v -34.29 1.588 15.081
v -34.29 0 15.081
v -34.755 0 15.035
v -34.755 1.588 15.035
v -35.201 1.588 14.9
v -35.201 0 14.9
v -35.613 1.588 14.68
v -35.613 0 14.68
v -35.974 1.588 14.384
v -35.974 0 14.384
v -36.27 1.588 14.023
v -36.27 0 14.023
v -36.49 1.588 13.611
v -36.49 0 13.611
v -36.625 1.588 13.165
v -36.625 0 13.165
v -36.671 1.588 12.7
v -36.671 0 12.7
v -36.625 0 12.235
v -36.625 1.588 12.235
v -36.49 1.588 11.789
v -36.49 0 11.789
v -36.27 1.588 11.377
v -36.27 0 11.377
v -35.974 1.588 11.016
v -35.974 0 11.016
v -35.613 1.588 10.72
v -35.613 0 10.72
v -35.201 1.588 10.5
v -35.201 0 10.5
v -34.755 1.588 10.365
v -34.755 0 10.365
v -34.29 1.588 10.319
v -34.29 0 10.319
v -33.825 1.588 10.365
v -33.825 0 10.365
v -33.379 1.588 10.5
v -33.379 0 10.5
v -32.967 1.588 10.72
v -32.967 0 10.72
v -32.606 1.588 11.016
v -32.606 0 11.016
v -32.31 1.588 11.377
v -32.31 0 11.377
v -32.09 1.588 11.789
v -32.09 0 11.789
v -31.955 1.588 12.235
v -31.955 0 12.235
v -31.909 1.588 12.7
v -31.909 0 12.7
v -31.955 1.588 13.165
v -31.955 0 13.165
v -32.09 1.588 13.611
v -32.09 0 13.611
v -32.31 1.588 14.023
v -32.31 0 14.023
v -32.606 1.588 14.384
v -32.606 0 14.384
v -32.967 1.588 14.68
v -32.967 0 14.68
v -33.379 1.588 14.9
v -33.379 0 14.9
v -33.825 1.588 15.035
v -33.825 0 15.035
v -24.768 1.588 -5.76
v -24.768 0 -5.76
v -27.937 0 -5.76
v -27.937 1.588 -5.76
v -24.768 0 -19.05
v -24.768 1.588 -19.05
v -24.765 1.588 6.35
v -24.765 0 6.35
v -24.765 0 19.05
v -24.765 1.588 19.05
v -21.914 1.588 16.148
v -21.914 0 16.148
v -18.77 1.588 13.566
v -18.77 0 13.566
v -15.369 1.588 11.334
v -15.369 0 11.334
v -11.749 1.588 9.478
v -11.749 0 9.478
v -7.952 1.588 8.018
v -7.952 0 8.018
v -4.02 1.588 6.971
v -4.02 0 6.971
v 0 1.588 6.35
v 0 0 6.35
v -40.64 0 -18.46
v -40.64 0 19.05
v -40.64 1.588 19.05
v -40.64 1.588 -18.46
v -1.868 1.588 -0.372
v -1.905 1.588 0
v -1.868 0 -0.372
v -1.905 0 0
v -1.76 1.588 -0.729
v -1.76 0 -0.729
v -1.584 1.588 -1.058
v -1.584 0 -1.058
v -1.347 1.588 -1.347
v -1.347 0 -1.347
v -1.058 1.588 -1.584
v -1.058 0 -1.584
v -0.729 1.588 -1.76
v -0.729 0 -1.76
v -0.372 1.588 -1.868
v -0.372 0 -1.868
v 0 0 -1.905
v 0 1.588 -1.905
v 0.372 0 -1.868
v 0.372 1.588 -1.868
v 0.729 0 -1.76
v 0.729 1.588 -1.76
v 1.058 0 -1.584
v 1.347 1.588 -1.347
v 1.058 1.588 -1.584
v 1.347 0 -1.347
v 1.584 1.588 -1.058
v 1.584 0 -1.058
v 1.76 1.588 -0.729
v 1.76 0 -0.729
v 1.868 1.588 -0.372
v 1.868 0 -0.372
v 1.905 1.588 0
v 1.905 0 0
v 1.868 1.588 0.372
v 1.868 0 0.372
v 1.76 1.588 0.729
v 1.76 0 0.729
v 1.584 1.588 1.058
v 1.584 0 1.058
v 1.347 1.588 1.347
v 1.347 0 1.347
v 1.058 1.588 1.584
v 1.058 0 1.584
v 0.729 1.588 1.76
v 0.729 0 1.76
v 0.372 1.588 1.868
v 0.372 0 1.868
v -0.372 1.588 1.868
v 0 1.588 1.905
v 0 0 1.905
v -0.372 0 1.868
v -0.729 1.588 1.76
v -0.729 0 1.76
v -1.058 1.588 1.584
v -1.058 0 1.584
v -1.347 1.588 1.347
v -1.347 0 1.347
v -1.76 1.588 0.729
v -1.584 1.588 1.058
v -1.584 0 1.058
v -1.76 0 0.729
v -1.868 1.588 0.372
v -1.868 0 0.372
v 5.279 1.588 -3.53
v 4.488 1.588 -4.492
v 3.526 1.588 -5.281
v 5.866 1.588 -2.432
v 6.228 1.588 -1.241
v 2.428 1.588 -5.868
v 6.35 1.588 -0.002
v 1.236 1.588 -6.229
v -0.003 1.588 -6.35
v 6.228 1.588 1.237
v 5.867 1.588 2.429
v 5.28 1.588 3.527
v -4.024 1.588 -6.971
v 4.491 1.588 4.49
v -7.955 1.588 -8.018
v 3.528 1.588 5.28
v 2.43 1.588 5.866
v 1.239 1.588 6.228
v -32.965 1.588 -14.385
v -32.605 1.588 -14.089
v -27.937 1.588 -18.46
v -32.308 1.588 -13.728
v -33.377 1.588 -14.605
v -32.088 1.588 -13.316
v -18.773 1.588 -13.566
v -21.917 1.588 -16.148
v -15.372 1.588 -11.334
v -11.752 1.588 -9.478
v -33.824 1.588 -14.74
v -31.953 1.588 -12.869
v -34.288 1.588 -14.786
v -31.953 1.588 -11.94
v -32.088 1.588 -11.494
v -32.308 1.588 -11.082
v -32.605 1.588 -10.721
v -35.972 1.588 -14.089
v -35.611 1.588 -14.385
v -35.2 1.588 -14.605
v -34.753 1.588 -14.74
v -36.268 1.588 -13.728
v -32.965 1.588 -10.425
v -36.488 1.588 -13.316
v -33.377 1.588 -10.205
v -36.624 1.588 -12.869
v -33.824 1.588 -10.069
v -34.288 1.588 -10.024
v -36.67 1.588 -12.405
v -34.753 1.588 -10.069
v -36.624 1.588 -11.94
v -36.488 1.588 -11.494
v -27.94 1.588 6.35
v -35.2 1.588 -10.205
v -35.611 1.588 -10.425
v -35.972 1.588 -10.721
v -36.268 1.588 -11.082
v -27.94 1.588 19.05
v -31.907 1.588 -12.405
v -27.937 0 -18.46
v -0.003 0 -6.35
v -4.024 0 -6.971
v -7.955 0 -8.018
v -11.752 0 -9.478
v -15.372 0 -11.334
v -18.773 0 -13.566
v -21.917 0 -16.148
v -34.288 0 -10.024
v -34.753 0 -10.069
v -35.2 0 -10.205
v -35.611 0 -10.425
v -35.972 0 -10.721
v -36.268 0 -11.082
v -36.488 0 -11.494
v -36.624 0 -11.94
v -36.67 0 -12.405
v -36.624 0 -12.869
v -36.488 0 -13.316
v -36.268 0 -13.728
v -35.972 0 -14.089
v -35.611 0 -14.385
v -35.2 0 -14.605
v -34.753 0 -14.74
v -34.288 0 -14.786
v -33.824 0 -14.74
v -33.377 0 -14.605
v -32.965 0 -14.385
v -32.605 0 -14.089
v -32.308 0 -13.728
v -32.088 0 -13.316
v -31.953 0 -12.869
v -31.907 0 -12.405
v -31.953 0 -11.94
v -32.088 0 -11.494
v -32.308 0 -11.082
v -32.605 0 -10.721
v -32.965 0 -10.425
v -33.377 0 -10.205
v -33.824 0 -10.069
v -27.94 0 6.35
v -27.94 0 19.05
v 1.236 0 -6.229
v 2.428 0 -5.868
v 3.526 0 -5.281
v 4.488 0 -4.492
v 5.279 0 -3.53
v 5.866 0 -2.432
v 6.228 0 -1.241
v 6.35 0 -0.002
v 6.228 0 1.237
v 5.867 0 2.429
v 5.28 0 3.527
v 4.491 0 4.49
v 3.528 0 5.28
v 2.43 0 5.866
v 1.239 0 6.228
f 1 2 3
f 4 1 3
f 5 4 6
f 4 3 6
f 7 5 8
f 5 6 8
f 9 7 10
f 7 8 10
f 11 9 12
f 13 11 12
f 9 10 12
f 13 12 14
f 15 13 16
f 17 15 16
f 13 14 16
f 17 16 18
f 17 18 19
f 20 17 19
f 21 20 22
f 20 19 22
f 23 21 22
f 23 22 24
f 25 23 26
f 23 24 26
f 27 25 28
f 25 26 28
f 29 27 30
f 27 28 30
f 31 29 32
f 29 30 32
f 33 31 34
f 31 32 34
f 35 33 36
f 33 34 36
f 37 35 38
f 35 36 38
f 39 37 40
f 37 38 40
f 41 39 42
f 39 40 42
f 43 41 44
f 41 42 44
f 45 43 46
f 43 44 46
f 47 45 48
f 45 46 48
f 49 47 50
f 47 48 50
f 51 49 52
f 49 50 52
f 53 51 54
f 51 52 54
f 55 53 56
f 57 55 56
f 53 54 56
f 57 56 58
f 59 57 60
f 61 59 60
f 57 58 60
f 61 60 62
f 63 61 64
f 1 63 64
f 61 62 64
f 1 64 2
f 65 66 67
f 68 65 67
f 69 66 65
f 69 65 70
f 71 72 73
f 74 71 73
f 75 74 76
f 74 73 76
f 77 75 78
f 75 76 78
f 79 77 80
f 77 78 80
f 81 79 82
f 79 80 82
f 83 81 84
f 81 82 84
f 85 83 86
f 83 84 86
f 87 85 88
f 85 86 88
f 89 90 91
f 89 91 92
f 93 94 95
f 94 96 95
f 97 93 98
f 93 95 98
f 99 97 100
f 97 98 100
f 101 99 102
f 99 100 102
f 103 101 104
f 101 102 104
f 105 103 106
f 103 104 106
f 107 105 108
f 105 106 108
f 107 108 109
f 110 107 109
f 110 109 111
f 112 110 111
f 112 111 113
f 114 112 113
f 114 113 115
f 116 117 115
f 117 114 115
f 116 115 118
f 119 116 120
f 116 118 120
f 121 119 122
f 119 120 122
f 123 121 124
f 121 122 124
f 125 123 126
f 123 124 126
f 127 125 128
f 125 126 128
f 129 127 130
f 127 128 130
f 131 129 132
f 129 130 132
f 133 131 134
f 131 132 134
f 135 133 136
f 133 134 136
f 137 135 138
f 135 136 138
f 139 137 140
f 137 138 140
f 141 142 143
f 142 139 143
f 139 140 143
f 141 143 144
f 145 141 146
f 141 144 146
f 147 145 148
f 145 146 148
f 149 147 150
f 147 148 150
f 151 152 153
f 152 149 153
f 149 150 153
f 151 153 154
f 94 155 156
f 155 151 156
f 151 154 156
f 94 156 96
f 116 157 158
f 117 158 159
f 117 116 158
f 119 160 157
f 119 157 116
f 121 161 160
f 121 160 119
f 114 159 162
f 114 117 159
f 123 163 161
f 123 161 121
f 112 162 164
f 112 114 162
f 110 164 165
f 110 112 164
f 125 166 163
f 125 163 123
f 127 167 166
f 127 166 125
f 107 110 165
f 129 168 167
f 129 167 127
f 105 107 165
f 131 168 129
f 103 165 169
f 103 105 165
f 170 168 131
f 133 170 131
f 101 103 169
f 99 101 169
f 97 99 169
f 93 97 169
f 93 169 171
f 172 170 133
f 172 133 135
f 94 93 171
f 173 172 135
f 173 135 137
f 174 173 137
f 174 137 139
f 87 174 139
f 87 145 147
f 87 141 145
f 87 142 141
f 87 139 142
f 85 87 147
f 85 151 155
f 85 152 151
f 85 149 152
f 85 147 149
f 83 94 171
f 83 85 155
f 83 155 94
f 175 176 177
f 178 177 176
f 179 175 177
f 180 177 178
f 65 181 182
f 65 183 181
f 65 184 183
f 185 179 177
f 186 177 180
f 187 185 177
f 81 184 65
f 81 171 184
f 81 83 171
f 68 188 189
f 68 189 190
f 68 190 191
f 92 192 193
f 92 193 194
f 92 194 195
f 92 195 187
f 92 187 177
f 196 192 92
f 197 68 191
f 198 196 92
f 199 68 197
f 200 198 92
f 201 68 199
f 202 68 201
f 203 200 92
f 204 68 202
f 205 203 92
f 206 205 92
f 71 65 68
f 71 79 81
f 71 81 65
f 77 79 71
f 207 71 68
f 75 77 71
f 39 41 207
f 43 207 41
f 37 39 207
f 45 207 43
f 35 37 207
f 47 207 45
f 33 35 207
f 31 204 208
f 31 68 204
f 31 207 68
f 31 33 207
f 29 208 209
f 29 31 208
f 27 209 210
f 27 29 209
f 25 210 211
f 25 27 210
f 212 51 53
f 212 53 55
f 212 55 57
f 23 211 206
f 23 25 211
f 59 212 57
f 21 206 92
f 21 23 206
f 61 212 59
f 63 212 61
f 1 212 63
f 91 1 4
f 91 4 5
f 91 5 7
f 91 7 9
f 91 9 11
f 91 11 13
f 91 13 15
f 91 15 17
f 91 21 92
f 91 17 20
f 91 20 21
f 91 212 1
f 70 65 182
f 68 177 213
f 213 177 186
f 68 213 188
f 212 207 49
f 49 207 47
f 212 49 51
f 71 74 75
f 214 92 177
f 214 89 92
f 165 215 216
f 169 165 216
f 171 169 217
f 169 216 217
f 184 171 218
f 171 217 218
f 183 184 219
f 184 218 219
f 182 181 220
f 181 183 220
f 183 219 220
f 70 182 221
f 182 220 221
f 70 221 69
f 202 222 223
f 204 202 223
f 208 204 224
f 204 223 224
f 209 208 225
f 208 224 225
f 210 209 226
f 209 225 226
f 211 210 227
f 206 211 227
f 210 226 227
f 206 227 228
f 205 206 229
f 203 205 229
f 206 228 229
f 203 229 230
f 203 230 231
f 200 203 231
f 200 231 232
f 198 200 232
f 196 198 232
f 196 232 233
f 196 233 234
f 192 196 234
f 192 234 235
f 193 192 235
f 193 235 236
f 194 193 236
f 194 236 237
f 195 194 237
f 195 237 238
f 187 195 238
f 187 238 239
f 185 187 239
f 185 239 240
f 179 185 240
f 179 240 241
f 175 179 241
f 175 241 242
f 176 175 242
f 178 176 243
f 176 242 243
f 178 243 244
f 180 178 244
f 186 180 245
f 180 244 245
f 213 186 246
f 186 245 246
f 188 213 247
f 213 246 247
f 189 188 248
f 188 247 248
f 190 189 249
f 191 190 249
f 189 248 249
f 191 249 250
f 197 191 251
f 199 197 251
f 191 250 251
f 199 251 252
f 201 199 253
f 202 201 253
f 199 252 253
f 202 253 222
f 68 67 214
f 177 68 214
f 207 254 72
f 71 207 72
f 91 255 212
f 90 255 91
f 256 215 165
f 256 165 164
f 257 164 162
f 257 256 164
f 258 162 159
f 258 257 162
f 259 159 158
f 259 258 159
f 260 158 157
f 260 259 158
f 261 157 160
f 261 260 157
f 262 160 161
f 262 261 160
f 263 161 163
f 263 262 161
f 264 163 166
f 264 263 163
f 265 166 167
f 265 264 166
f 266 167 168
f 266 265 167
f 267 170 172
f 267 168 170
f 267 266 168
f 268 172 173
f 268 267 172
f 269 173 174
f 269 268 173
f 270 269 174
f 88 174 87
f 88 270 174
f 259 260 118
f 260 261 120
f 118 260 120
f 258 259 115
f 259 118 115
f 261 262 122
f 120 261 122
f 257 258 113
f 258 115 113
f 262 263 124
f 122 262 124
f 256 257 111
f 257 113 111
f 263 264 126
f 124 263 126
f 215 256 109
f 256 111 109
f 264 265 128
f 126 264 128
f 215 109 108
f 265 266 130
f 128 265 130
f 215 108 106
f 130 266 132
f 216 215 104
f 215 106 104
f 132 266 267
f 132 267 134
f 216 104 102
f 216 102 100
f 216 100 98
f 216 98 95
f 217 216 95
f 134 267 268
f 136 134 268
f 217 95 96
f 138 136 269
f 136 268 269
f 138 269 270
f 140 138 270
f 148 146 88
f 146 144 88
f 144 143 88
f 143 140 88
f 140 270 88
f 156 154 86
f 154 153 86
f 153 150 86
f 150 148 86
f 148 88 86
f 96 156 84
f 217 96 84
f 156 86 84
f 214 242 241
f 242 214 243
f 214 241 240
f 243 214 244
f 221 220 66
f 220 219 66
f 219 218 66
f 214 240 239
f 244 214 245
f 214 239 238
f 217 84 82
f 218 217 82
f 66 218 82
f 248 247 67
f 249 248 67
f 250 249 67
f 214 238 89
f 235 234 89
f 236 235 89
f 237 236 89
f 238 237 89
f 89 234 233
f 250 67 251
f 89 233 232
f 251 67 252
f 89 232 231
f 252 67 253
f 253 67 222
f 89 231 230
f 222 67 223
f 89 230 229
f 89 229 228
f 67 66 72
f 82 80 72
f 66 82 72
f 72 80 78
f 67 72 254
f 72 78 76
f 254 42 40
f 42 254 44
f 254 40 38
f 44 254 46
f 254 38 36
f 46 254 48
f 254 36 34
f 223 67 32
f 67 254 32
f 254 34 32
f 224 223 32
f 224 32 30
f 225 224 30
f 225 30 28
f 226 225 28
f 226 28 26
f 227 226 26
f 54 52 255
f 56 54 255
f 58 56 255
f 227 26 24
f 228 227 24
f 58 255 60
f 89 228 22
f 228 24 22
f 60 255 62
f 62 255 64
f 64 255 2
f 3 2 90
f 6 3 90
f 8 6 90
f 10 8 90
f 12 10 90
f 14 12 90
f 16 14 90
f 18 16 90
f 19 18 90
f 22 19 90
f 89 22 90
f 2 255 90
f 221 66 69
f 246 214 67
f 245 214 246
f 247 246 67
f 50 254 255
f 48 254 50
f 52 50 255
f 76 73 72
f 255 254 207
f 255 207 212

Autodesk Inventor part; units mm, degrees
ref_plane "YZ Plane" through (0, 0, 0) normal (1, 0, 0) x (0, 1, 0)
ref_plane "XZ Plane" through (0, 0, 0) normal (0, 1, 0) x (-1, 0, 0)
ref_plane "XY Plane" through (0, 0, 0) normal (0, 0, 1) x (1, 0, 0)
sketch "Sketch1" plane through (0, 0, 0) normal (0, 1, 0) x (-1, 0, 0)
  arc A0 (0, 6.35) -> (0.0031, -6.35) centre (0, 0) ccw
  line L0 (27.9369, -5.7599) -> (27.9369, -18.4599)
  line L1 (27.94, 6.35) -> (27.94, 19.05)
  line L2 (27.94, 19.05) -> (40.64, 19.05)
  line L3 (40.64, 19.05) -> (40.64, -18.4599)
  line L4 (40.64, -18.4599) -> (27.9369, -18.4599)
  circle A1 centre (0, 0) radius 1.905
  line L5 (27.94, 6.35) -> (24.765, 6.35)
  line L6 (24.765, 6.35) -> (24.765, 19.05)
  line L7 (24.7681, -5.7599) -> (24.7681, -19.05)
  arc A2 (24.7681, -19.05) -> (0.0031, -6.35) centre (-3.7989, -44.2598) ccw
  arc A3 (0, 6.35) -> (24.765, 19.05) centre (-3.802, 44.2598) ccw
  line L8 (24.7681, -5.7599) -> (27.9369, -5.7599)
  point P0 (0, 0)
  dimension "d4" = 27.94
  dimension "d5" = 27.94
  dimension "d6" = 12.7
  dimension "d7" = 12.7
  dimension "d8" = 12.7
  dimension "d19" = 3.81
  dimension "d20" = 3.175
  dimension "d21" = 38.1
  dimension "d22" = 38.1
extrude "Extrusion1" add sketch "Sketch1" along normal blind 1.5875
sketch "Sketch2" plane through (0, 1.5875, 0) normal (0, 1, 0) x (1, 0, 0)
  line L0 (-27.9369, 18.4599) -> (-40.64, 18.4599) projected
  line L1 (-27.9369, 5.7599) -> (-27.9369, 18.4599) projected
  line L2 (-40.64, 18.4599) -> (-27.9369, 5.7599)
  line L3 (-40.64, -19.05) -> (-27.94, -19.05) projected
  line L4 (-27.94, -6.35) -> (0, -6.35) projected
  line L5 (-40.64, -19.05) -> (-27.94, -6.35)
  line L6 (-27.94, -19.05) -> (-40.64, -6.35)
  line L7 (-27.9369, 18.4599) -> (-40.64, 6.35)
  line L8 (-40.64, 18.4599) -> (-40.64, -19.05) projected
  point P0 (0, 0)
  point P1 (-34.2884, 12.4049)
  point P2 (-34.29, -12.7)
hole "Hole1" at (-34.2884, 1.5875, -12.4049) at (-34.29, 1.5875, 12.7) direction (0, -1, 0) diameter 4.7625 end through all
properties part number "indexer" material "ABS Plastic"
